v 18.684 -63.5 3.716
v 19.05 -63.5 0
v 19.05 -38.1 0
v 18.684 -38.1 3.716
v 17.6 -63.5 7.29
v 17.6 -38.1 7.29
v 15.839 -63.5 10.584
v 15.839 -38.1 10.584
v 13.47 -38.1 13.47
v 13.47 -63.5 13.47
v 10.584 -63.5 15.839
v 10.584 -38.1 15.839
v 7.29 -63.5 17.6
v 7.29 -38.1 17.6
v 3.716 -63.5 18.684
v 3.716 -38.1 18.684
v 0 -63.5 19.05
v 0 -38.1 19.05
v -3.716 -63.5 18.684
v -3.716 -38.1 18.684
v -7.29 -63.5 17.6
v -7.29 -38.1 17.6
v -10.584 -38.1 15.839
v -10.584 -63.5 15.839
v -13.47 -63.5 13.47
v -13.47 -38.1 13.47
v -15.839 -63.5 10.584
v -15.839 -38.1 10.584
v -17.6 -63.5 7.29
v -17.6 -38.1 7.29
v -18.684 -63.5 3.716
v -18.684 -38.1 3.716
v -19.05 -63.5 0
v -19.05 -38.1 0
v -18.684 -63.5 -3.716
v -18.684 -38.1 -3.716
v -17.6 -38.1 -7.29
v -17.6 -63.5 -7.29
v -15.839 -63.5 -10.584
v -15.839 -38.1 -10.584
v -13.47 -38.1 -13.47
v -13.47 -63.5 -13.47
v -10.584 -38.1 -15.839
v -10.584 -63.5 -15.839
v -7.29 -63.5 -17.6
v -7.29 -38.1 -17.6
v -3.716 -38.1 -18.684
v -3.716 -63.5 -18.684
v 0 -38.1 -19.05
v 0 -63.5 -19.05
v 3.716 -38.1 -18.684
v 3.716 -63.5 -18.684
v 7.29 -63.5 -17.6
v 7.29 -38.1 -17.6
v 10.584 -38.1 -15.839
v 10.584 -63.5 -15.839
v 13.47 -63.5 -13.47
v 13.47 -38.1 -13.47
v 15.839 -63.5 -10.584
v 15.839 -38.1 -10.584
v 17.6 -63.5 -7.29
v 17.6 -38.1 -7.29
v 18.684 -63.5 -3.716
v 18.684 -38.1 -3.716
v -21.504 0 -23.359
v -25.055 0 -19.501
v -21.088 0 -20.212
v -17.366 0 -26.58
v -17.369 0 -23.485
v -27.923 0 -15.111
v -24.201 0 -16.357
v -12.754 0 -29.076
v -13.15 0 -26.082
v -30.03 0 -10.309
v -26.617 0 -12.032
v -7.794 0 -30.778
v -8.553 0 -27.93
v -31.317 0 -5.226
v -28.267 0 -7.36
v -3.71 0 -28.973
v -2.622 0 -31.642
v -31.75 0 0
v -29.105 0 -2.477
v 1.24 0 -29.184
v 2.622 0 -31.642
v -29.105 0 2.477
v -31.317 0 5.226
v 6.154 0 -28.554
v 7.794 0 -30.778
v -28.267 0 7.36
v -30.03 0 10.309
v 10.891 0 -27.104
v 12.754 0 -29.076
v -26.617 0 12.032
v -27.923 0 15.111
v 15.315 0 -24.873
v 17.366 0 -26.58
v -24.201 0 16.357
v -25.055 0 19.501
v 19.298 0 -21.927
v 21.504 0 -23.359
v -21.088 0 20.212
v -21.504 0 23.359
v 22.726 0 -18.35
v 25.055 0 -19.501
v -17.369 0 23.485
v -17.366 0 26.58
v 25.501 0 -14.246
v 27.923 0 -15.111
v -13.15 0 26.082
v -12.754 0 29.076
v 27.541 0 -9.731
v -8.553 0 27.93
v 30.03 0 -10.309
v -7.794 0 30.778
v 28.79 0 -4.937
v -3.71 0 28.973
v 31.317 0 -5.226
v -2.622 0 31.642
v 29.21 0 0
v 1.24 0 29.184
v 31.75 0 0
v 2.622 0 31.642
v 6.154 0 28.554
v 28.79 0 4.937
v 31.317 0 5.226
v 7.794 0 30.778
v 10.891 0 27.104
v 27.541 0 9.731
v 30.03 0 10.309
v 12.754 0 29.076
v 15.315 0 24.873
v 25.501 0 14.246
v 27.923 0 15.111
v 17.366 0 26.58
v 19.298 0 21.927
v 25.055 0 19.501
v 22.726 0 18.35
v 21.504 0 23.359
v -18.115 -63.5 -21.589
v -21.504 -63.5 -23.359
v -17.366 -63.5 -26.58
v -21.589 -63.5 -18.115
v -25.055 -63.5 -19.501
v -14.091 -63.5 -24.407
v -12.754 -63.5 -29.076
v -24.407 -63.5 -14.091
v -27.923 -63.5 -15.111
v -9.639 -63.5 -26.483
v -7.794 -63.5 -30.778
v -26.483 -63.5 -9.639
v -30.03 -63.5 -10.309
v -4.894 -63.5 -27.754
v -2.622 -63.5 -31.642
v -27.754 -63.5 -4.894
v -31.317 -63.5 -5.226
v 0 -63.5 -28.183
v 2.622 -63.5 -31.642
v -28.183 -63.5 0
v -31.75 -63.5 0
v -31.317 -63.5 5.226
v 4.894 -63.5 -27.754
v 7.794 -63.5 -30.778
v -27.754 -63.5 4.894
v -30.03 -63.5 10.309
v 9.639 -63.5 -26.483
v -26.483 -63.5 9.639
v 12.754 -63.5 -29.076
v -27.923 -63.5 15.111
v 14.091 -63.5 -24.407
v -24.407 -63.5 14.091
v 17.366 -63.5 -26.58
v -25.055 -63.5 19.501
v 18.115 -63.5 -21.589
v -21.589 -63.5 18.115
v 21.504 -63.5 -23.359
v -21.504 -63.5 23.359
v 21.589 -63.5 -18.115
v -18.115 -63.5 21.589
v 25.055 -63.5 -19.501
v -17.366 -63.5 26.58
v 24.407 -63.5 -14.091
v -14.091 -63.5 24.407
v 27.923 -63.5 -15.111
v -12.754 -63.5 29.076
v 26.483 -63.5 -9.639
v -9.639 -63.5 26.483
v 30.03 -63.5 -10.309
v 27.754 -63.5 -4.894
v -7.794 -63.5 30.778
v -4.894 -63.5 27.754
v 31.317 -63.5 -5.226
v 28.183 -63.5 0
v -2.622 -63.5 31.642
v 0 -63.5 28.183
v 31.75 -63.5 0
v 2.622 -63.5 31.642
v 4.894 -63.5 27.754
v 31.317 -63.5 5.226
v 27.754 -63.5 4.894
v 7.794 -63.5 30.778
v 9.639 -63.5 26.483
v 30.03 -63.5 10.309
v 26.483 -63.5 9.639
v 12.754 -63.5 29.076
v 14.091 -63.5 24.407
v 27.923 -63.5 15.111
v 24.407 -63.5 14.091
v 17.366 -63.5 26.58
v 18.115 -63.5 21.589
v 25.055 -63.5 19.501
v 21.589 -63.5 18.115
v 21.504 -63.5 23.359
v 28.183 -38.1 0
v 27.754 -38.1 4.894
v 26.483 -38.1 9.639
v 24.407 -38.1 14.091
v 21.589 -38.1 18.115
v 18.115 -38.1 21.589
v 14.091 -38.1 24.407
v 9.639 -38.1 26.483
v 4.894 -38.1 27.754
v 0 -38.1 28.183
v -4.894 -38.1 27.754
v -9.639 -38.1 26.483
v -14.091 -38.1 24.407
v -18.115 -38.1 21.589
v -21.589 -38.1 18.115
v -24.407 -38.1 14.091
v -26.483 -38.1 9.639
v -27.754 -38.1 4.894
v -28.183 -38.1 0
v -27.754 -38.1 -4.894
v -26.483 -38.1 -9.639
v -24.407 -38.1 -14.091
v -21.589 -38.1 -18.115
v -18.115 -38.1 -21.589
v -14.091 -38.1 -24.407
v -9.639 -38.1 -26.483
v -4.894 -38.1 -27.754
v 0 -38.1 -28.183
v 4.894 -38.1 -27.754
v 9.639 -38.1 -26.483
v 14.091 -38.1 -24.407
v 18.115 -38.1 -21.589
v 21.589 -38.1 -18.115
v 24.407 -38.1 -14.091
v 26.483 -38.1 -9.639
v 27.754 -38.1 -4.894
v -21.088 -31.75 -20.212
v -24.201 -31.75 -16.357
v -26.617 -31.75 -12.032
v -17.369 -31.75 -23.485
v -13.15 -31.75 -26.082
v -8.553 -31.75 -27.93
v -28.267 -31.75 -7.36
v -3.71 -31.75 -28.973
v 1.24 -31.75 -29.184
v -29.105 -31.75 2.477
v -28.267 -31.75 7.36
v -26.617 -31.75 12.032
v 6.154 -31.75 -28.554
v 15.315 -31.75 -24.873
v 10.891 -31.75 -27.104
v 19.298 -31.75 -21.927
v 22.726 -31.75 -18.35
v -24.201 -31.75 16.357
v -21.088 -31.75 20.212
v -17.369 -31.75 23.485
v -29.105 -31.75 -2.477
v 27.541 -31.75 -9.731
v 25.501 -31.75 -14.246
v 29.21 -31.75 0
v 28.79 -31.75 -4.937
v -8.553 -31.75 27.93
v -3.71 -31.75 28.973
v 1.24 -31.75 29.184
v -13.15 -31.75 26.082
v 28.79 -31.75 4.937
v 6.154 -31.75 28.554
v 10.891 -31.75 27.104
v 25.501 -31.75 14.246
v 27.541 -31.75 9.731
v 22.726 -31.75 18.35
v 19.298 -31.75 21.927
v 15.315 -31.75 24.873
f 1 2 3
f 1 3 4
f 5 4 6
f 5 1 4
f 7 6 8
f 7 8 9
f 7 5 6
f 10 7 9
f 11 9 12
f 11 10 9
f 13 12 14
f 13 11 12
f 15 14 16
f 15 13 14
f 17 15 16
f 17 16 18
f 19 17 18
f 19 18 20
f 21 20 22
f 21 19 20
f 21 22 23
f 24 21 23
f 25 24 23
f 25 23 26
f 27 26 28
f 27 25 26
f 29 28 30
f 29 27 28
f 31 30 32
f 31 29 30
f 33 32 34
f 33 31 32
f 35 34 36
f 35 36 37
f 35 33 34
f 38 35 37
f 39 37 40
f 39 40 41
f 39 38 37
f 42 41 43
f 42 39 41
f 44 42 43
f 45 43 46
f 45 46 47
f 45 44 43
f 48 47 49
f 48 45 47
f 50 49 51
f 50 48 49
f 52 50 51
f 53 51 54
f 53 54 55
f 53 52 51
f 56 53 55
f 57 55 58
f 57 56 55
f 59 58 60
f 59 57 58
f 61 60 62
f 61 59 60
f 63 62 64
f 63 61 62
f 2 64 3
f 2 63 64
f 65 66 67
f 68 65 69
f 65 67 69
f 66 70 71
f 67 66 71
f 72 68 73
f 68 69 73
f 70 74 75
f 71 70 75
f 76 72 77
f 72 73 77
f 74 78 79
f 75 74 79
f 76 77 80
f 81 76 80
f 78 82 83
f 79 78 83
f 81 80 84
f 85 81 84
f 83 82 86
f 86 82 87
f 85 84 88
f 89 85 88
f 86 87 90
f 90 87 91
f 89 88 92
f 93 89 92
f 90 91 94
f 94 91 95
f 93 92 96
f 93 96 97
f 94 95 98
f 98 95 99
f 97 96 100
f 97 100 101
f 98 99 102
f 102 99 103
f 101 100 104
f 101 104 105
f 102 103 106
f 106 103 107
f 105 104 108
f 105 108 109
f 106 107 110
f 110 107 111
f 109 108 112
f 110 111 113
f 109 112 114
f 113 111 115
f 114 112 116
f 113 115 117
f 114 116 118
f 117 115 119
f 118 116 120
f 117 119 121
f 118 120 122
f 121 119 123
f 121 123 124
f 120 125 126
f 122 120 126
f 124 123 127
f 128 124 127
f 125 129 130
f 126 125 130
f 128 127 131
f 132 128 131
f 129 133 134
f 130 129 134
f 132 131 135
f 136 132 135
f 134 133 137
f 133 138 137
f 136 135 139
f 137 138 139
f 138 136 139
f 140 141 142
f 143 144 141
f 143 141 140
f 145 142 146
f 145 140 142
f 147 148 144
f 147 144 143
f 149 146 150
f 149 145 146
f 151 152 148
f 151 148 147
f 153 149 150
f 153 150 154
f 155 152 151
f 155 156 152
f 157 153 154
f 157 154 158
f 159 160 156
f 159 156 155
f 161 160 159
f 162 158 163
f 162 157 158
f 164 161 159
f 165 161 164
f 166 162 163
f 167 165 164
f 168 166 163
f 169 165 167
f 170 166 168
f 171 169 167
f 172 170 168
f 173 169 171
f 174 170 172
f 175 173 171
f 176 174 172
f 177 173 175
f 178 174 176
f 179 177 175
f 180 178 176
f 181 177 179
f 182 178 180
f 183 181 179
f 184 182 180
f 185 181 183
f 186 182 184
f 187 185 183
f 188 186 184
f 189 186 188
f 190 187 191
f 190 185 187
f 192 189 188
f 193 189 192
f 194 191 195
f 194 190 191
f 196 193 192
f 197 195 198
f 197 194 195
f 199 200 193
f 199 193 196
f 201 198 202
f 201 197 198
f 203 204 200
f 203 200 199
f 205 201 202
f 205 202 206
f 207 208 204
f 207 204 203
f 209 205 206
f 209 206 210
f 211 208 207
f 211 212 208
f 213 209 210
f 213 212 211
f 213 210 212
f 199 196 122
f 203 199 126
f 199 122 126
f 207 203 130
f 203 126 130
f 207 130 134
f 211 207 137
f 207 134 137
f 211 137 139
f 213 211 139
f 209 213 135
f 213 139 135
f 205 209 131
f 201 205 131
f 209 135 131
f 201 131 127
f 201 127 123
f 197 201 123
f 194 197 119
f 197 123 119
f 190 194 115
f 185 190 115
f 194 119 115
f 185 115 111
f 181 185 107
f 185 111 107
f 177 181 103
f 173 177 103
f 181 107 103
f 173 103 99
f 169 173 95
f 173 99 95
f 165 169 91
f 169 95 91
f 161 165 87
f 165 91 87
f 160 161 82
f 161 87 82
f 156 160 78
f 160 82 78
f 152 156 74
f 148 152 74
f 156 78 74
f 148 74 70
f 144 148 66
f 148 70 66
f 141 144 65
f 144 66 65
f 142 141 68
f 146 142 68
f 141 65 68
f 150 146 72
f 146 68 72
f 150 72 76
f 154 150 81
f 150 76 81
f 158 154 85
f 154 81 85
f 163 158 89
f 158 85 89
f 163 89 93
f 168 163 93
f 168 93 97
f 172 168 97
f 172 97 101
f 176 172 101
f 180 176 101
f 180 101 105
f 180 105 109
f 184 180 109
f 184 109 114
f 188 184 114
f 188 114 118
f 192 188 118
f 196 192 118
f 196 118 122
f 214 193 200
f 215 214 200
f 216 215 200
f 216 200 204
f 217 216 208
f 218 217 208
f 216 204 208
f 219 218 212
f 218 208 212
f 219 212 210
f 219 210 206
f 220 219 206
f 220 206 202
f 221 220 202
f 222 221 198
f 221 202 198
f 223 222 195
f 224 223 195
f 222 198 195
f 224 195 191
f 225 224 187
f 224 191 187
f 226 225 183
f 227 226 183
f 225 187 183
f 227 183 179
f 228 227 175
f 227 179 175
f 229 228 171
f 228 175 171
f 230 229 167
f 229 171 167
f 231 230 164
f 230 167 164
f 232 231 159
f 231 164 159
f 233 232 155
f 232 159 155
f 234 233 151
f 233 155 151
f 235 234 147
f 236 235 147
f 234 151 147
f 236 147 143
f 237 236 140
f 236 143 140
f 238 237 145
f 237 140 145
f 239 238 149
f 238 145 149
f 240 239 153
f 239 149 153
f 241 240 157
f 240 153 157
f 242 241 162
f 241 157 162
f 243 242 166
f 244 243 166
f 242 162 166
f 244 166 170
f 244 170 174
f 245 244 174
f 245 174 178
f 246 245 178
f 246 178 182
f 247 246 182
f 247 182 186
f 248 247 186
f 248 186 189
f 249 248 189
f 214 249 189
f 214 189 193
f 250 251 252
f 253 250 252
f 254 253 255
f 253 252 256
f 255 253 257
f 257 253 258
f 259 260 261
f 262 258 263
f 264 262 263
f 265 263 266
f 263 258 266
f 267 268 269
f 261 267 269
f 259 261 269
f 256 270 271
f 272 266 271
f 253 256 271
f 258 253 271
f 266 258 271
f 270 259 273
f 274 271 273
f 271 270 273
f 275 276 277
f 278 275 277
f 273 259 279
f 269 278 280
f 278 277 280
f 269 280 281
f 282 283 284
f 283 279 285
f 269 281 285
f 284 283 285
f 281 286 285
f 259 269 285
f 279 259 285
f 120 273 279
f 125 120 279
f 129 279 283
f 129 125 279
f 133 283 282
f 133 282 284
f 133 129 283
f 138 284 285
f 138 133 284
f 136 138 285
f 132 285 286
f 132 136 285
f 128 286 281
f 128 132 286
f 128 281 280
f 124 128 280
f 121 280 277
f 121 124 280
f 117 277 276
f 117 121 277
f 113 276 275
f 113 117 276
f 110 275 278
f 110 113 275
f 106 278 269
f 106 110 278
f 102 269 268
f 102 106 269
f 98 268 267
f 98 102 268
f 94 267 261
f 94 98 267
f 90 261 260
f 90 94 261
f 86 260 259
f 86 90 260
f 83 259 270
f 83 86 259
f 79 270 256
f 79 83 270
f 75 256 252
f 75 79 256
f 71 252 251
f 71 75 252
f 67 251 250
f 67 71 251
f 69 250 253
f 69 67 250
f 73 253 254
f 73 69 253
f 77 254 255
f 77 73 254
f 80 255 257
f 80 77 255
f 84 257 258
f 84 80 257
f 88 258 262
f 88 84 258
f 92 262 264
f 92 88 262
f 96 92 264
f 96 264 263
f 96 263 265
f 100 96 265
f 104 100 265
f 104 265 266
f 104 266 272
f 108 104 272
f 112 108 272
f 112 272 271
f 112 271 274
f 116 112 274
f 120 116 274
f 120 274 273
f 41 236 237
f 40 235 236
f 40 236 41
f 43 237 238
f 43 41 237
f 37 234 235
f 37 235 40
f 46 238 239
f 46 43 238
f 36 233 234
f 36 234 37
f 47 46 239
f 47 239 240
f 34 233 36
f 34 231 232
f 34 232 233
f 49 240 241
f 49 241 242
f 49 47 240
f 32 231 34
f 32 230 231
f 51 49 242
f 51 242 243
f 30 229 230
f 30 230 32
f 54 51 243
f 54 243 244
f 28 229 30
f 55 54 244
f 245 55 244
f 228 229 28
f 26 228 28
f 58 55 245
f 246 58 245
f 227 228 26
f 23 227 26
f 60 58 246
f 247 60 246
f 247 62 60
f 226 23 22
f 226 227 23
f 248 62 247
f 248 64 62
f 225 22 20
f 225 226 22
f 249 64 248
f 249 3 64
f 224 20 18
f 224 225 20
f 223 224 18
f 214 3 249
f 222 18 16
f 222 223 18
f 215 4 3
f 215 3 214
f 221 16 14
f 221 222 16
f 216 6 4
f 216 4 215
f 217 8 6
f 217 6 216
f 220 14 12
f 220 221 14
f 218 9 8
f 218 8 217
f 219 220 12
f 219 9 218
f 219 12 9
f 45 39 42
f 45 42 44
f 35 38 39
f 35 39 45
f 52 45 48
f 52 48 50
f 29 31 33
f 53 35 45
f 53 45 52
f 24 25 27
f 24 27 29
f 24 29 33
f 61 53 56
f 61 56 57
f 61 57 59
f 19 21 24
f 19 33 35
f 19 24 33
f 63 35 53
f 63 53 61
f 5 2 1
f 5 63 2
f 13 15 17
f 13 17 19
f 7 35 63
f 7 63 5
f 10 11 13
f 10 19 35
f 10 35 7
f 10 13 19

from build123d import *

# Parameters (mm, degrees)
F0_R     = 31.75
F1_DEPTH = 63.5
F2_R     = 29.21
F3_DEPTH = 31.75
F4_R     = 28.182549
F4_R_2   = 19.05
F5_DEPTH = 25.4


with BuildPart() as f1:
    # F0 (on Front) → F1 (new body)
    with BuildSketch(Plane.XZ):
        Circle(F0_R)
    extrude(amount=F1_DEPTH)

    # F2 (on Front) → F3 (cut)
    with BuildSketch(Plane.XZ):
        Circle(F2_R)
    extrude(amount=F3_DEPTH, mode=Mode.SUBTRACT)

    # F4 (on face) → F5 (cut)
    with BuildSketch(Plane.XZ.offset(63.5)):
        Circle(F4_R)
        Circle(F4_R_2, mode=Mode.SUBTRACT)
    extrude(amount=-F5_DEPTH, mode=Mode.SUBTRACT)


solid = f1.part
